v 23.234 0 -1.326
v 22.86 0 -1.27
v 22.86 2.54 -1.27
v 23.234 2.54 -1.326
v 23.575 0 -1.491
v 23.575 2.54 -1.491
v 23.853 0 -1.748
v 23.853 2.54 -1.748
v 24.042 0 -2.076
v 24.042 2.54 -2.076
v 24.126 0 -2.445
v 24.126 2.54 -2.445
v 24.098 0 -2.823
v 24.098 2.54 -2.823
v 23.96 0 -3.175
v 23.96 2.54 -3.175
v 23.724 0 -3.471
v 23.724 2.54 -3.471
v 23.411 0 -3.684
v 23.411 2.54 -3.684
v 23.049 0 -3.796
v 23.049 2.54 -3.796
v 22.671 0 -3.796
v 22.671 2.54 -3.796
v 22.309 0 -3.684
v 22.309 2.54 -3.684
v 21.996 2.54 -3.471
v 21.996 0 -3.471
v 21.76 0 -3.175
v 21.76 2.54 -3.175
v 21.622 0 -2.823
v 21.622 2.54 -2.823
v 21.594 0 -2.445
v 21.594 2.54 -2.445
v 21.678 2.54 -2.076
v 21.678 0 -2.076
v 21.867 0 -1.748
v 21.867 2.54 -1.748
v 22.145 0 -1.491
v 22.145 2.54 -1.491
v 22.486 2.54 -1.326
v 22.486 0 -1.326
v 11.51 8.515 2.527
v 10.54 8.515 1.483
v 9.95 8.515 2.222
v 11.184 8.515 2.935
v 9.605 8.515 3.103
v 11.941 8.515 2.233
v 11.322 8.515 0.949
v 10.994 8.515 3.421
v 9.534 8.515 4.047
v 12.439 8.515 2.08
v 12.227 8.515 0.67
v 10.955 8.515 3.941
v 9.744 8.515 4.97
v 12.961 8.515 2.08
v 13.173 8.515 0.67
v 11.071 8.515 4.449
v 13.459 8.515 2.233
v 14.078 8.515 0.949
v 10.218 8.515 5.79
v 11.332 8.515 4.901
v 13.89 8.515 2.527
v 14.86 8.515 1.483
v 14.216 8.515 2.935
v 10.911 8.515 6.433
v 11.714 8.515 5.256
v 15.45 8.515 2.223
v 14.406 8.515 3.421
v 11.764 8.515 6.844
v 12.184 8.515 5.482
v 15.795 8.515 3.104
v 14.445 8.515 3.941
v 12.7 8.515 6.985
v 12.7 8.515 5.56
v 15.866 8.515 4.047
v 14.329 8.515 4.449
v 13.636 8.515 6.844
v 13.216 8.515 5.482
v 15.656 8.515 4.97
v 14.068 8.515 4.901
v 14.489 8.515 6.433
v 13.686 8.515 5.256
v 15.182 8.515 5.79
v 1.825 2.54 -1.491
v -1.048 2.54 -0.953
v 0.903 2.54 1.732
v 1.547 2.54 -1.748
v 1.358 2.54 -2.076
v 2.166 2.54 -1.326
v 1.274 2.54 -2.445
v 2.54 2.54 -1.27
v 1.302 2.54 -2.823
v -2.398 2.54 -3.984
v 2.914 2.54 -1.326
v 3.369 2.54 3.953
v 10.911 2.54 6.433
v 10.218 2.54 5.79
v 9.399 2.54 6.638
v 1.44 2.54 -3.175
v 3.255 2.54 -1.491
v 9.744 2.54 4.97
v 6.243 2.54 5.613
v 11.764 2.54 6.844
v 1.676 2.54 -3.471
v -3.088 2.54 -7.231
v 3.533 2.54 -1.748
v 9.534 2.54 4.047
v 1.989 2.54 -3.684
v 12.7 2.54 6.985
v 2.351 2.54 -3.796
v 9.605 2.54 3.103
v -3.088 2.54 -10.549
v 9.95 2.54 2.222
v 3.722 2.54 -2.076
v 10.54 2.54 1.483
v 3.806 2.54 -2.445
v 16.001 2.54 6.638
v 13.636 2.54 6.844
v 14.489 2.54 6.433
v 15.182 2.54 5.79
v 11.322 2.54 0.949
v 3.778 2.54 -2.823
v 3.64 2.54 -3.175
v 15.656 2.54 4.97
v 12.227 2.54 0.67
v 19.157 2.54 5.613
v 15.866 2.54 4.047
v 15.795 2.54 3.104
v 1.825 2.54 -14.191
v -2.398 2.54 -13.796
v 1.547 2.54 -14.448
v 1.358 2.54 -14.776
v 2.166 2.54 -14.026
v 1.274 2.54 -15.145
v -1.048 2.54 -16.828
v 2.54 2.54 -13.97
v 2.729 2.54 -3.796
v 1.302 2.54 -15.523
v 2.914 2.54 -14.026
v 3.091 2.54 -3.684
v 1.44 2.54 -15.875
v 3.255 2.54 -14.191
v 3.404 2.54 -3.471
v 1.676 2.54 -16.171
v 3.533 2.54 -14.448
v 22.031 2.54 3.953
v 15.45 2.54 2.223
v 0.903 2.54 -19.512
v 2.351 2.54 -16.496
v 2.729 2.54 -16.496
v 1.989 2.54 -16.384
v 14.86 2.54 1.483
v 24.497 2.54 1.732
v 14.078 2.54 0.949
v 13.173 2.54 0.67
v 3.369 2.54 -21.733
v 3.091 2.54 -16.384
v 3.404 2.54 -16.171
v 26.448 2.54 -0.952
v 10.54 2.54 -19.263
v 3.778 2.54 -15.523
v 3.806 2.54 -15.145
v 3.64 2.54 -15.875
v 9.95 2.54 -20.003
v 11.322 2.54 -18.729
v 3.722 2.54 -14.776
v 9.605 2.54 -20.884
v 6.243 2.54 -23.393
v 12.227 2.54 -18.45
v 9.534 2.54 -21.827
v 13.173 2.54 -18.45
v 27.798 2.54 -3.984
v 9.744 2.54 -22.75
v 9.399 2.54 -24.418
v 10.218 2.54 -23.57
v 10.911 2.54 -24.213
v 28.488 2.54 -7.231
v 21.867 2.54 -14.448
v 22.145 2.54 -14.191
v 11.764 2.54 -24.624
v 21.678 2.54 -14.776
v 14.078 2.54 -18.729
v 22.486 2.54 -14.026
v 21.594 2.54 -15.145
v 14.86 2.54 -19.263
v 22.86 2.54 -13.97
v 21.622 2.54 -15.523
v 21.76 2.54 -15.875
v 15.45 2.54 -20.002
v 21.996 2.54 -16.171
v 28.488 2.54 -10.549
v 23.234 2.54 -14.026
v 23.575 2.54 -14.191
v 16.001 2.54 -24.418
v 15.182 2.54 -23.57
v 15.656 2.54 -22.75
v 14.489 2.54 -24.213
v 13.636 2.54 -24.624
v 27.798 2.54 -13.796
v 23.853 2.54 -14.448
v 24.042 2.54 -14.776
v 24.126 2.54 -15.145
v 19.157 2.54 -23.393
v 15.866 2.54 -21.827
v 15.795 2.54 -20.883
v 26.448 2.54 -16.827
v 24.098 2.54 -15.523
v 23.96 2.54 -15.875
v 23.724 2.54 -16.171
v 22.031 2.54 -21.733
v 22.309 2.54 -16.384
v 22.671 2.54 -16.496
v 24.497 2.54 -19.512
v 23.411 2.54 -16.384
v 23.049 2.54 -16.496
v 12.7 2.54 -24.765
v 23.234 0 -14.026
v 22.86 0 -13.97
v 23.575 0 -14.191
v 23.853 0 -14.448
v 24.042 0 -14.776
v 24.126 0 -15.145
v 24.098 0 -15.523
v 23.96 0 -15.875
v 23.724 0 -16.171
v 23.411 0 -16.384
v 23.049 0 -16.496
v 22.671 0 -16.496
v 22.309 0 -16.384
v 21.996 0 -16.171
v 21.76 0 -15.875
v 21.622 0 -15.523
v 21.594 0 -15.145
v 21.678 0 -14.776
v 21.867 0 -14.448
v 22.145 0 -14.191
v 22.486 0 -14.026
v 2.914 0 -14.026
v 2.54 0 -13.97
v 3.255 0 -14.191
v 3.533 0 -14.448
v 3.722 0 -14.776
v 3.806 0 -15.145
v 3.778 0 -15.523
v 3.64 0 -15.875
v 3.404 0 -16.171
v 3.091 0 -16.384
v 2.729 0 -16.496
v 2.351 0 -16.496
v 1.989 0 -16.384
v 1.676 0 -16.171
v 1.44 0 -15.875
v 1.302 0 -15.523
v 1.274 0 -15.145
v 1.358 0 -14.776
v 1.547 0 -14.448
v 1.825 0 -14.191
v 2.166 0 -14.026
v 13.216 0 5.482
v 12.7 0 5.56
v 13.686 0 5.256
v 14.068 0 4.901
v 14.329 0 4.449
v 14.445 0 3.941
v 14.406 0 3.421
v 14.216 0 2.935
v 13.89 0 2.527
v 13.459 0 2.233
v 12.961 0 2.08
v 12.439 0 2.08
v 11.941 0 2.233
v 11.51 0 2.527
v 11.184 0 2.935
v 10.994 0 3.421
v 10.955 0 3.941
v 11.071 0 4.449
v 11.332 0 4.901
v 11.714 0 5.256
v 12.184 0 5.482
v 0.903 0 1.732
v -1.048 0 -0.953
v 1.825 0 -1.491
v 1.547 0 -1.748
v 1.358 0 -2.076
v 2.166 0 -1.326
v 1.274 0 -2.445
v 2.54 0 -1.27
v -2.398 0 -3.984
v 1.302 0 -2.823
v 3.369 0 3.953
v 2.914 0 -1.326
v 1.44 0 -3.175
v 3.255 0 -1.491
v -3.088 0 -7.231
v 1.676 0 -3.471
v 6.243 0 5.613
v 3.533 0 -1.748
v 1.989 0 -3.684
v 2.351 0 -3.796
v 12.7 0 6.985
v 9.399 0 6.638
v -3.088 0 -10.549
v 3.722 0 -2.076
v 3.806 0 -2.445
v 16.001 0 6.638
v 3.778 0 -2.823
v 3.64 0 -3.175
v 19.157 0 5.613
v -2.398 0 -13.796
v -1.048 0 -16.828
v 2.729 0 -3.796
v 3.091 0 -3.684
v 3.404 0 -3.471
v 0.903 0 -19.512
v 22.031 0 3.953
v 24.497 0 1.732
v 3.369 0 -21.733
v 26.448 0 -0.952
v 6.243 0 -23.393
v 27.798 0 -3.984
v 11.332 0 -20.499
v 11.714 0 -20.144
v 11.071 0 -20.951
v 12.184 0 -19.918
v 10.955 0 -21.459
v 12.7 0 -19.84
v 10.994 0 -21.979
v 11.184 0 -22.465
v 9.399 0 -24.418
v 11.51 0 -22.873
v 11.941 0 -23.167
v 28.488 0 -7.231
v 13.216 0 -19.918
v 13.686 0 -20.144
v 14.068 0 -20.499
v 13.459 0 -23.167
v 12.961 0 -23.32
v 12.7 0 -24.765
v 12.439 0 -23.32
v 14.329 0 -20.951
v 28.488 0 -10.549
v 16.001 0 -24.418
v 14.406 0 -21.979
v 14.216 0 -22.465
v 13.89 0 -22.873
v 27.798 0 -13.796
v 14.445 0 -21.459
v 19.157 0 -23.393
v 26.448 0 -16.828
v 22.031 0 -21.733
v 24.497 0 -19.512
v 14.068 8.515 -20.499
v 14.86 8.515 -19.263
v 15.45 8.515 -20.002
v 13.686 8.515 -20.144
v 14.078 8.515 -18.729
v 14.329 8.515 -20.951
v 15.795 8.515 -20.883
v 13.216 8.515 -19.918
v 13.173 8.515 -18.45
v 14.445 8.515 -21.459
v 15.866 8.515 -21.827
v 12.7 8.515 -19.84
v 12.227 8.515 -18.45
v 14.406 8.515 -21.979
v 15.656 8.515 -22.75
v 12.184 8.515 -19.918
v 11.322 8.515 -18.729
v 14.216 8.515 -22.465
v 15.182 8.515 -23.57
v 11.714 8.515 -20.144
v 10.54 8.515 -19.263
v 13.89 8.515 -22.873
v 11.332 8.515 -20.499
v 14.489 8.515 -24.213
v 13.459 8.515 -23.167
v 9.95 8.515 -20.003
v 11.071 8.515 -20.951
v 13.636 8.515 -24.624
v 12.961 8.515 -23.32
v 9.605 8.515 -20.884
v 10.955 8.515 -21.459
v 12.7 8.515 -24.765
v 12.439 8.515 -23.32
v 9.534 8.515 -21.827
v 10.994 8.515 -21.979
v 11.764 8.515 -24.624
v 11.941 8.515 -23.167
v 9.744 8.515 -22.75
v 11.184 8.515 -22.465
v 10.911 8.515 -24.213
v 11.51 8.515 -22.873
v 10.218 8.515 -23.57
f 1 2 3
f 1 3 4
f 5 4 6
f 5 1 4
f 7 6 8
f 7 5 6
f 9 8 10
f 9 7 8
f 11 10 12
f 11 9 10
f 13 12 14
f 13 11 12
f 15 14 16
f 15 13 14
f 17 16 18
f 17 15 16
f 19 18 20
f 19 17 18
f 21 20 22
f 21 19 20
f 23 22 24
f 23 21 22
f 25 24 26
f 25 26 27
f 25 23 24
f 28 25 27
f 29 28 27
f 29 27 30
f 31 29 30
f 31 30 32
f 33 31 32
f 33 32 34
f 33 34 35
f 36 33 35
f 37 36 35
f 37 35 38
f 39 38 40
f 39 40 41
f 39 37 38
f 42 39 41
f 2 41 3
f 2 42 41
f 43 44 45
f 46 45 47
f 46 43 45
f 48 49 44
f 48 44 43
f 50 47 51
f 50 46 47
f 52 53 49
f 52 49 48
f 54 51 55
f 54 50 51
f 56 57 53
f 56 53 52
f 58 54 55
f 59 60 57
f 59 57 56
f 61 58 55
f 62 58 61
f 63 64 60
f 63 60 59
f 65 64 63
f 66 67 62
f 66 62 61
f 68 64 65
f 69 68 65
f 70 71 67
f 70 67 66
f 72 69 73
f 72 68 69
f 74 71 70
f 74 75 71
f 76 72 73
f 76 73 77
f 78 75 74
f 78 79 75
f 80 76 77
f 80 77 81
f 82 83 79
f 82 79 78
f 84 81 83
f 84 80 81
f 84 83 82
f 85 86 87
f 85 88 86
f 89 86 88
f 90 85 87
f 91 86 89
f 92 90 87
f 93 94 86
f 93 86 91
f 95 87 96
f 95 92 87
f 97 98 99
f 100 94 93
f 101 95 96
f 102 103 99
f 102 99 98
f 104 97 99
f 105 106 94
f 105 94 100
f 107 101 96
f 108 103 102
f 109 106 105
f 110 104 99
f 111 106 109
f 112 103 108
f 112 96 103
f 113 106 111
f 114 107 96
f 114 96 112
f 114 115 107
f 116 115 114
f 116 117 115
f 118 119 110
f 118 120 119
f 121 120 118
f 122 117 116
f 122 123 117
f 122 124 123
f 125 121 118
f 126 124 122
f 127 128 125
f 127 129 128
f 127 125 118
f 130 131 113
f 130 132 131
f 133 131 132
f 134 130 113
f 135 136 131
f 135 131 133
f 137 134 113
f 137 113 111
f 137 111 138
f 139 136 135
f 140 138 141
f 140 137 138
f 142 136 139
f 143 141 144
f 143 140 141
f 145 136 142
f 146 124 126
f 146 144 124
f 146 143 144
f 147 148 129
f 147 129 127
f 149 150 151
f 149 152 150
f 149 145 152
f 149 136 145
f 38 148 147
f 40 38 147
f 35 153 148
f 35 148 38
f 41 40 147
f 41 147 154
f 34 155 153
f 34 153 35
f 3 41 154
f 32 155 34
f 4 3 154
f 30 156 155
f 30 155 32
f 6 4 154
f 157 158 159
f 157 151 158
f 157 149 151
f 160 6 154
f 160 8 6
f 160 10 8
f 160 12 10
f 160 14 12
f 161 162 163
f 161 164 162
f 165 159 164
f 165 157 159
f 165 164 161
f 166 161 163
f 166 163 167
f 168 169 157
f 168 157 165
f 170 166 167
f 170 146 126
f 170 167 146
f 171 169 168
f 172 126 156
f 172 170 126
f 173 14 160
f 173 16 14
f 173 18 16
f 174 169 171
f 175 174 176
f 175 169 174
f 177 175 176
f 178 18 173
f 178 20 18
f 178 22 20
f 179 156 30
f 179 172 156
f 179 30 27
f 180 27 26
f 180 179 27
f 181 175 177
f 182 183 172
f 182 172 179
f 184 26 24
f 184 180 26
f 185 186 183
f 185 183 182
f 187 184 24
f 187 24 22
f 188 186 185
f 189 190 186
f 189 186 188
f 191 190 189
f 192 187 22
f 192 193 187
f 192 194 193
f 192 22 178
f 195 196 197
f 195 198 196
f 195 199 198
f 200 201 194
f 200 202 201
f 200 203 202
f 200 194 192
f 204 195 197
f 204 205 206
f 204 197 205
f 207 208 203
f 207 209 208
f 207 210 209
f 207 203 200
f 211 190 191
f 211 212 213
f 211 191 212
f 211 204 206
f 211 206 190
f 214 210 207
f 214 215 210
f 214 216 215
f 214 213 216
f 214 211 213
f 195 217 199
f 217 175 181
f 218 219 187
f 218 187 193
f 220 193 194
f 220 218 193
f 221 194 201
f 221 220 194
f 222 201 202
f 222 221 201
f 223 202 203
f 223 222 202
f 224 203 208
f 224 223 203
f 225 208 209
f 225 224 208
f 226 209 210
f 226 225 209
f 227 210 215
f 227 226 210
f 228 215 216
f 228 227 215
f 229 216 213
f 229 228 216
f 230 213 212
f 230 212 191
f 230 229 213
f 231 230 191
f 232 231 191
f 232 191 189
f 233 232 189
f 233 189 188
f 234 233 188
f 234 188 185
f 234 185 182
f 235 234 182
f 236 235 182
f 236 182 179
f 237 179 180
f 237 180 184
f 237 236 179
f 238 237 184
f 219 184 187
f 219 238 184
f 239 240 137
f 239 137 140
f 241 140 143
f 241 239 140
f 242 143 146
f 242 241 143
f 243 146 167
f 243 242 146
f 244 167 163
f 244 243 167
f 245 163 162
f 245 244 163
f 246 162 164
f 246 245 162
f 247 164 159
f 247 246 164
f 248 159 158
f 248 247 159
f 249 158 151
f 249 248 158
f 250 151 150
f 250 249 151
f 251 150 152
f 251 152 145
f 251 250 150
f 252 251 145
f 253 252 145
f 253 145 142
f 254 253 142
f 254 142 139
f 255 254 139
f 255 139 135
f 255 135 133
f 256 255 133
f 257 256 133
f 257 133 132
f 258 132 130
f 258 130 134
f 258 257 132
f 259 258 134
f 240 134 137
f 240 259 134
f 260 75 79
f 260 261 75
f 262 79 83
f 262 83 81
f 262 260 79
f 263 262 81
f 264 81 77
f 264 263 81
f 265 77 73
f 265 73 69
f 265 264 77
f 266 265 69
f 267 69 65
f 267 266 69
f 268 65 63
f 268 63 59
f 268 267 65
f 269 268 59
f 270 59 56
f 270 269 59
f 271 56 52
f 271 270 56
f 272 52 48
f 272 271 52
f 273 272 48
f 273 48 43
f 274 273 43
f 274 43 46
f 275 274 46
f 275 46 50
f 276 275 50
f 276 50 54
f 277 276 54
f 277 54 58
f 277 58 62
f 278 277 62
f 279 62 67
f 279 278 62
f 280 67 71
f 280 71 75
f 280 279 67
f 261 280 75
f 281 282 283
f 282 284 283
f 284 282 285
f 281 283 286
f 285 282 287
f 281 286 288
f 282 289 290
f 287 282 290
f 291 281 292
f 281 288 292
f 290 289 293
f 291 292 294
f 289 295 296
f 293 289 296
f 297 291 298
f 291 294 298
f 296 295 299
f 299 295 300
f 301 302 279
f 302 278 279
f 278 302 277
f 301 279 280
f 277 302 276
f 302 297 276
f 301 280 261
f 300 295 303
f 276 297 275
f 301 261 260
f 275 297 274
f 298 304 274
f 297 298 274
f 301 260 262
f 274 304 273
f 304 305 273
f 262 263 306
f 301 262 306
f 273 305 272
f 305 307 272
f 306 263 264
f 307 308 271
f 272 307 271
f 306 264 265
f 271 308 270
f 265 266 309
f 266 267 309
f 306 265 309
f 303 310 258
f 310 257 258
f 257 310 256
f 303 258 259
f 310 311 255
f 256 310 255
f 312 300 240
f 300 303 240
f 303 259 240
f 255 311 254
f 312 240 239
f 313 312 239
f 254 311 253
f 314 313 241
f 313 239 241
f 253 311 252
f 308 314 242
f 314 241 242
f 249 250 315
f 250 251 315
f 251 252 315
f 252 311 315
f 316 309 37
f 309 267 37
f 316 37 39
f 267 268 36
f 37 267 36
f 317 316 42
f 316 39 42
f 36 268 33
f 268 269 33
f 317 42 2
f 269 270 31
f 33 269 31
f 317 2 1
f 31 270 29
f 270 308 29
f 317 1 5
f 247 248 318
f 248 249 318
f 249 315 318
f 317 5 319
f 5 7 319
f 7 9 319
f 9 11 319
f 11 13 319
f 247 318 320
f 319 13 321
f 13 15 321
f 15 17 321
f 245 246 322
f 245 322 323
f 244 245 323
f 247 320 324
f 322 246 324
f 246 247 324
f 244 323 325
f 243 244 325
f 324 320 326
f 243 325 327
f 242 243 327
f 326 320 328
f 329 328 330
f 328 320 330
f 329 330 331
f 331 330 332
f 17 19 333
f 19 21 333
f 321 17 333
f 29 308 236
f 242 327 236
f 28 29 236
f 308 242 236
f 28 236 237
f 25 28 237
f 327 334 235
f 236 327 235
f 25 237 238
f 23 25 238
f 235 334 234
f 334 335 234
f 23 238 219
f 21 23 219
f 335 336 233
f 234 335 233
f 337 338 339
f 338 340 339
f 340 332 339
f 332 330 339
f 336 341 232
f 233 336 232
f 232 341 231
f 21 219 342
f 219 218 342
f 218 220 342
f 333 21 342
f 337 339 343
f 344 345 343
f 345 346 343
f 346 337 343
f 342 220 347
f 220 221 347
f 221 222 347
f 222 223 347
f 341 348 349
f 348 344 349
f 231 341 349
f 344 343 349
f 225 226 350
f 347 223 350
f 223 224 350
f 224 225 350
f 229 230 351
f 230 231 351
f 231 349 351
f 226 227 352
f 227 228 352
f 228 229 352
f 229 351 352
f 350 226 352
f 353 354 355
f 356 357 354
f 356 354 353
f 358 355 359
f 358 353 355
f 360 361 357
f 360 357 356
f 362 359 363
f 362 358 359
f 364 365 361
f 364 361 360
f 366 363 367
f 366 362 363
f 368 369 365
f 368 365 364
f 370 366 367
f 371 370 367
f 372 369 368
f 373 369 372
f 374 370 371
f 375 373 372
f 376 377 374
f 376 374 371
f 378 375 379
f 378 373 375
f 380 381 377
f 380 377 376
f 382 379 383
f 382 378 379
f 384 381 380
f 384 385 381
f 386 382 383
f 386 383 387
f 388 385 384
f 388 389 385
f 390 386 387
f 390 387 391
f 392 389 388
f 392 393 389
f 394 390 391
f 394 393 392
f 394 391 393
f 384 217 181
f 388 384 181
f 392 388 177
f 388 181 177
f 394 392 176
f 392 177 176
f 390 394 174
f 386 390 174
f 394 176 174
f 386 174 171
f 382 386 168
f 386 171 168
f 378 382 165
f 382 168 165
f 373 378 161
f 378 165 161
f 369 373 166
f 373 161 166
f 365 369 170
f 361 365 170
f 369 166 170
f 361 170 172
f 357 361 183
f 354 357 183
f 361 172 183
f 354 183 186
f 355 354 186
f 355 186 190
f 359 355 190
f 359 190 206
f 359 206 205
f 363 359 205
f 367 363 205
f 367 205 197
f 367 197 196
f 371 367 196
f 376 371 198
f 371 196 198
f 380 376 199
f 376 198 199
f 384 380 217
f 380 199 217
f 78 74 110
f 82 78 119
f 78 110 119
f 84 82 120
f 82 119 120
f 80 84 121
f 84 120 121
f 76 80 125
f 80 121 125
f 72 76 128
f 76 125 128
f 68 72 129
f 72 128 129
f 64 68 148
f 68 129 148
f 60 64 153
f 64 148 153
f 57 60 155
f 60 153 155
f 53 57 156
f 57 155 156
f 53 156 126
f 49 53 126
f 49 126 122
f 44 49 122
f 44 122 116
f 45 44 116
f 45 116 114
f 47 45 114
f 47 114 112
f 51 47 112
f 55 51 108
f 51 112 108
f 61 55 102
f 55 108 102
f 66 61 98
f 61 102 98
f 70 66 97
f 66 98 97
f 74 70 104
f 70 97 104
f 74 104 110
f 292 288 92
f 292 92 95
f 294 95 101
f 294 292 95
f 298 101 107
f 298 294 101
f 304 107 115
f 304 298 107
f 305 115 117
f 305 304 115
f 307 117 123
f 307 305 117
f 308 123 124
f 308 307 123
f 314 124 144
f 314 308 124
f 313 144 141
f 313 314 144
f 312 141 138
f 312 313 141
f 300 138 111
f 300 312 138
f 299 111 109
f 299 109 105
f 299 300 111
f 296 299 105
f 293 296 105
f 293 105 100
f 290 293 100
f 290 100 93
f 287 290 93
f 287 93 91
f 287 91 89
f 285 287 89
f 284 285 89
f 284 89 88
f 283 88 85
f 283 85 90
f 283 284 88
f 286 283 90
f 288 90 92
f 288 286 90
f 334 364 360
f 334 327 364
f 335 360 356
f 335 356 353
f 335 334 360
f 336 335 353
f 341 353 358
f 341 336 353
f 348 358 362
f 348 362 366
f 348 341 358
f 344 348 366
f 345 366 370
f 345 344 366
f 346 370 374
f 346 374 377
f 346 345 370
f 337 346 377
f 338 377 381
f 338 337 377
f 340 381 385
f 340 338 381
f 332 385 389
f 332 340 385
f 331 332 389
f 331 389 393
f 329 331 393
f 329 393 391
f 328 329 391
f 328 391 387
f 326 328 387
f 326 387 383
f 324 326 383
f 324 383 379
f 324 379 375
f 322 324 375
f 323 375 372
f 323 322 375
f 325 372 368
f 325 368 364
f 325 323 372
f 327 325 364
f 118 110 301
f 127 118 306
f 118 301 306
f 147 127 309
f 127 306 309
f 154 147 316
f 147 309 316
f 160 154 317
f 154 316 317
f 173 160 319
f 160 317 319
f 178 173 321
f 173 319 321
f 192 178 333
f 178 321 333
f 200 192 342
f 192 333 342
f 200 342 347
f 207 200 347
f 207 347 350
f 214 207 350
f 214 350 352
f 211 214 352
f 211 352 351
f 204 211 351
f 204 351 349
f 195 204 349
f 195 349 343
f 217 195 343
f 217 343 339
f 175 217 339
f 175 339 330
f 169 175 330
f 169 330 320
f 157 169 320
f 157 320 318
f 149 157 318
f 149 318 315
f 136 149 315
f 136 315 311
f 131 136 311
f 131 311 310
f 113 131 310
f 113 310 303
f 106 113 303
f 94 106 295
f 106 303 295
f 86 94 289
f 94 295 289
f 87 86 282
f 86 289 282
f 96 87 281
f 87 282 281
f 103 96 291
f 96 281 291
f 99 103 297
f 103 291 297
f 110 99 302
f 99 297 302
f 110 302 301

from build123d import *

# Parameters (mm, degrees)
SKETCH1_R           = 15.875
SKETCH1_R_2         = 1.75
SKETCH1_W           = 25.4
SKETCH1_H           = 17.78
SKETCH1_R_3         = 1.27
BOSS_EXTRUDE1_DEPTH = 2.54
SKETCH2_R           = 3.175
SKETCH2_R_2         = 1.75
BOSS_EXTRUDE2_DEPTH = 5.974999988


with BuildPart() as part:
    # Sketch1 → Boss-Extrude1 (new body)
    # profile 1 of 2: a face of its own
    with BuildSketch(Plane(origin=(0, 0, 0), x_dir=(1, 0, 0), z_dir=(0, 1, 0))):
        with Locations(Location((12.7, 8.89, 0), (0, 0, 270))):
            Circle(SKETCH1_R)
        with Locations(Location((12.7, 21.59, 0), (0, 0, 270))):
            Circle(SKETCH1_R_2, mode=Mode.SUBTRACT)
        with Locations(Location((12.7, -3.81, 0), (0, 0, 270))):
            Circle(SKETCH1_R_2, mode=Mode.SUBTRACT)
        with Locations((12.7, 8.89)):
            Rectangle(SKETCH1_W, SKETCH1_H, mode=Mode.SUBTRACT)
    # profile 2 of 2: a face of its own
    with BuildSketch(Plane(origin=(0, 0, 0), x_dir=(1, 0, 0), z_dir=(0, 1, 0))):
        with Locations((12.7, 8.89)):
            Rectangle(SKETCH1_W, SKETCH1_H)
        with Locations(Location((22.86, 15.24, 0), (0, 0, 270))):
            Circle(SKETCH1_R_3, mode=Mode.SUBTRACT)
        with Locations(Location((2.54, 15.24, 0), (0, 0, 270))):
            Circle(SKETCH1_R_3, mode=Mode.SUBTRACT)
        with Locations(Location((22.86, 2.54, 0), (0, 0, 270))):
            Circle(SKETCH1_R_3, mode=Mode.SUBTRACT)
        with Locations(Location((2.54, 2.54, 0), (0, 0, 270))):
            Circle(SKETCH1_R_3, mode=Mode.SUBTRACT)
    extrude(amount=BOSS_EXTRUDE1_DEPTH)

    # Sketch2 → Boss-Extrude2 (add)
    # profile 1 of 2: a face of its own
    with BuildSketch(Plane(origin=(0, 2.54, 0), x_dir=(1, 0, 0), z_dir=(0, 1, 0))):
        with Locations(Location((12.7, 21.59, 0), (0, 0, 89.999491582))):
            Circle(SKETCH2_R)
        with Locations(Location((12.7, 21.59, 0), (0, 0, 270))):
            Circle(SKETCH2_R_2, mode=Mode.SUBTRACT)
    # profile 2 of 2: a face of its own
    with BuildSketch(Plane(origin=(0, 2.54, 0), x_dir=(1, 0, 0), z_dir=(0, 1, 0))):
        with Locations(Location((12.7, -3.81, 0), (0, 0, 269.999491581))):
            Circle(SKETCH2_R)
        with Locations(Location((12.7, -3.81, 0), (0, 0, 270))):
            Circle(SKETCH2_R_2, mode=Mode.SUBTRACT)
    extrude(amount=BOSS_EXTRUDE2_DEPTH)


solid = part.part
